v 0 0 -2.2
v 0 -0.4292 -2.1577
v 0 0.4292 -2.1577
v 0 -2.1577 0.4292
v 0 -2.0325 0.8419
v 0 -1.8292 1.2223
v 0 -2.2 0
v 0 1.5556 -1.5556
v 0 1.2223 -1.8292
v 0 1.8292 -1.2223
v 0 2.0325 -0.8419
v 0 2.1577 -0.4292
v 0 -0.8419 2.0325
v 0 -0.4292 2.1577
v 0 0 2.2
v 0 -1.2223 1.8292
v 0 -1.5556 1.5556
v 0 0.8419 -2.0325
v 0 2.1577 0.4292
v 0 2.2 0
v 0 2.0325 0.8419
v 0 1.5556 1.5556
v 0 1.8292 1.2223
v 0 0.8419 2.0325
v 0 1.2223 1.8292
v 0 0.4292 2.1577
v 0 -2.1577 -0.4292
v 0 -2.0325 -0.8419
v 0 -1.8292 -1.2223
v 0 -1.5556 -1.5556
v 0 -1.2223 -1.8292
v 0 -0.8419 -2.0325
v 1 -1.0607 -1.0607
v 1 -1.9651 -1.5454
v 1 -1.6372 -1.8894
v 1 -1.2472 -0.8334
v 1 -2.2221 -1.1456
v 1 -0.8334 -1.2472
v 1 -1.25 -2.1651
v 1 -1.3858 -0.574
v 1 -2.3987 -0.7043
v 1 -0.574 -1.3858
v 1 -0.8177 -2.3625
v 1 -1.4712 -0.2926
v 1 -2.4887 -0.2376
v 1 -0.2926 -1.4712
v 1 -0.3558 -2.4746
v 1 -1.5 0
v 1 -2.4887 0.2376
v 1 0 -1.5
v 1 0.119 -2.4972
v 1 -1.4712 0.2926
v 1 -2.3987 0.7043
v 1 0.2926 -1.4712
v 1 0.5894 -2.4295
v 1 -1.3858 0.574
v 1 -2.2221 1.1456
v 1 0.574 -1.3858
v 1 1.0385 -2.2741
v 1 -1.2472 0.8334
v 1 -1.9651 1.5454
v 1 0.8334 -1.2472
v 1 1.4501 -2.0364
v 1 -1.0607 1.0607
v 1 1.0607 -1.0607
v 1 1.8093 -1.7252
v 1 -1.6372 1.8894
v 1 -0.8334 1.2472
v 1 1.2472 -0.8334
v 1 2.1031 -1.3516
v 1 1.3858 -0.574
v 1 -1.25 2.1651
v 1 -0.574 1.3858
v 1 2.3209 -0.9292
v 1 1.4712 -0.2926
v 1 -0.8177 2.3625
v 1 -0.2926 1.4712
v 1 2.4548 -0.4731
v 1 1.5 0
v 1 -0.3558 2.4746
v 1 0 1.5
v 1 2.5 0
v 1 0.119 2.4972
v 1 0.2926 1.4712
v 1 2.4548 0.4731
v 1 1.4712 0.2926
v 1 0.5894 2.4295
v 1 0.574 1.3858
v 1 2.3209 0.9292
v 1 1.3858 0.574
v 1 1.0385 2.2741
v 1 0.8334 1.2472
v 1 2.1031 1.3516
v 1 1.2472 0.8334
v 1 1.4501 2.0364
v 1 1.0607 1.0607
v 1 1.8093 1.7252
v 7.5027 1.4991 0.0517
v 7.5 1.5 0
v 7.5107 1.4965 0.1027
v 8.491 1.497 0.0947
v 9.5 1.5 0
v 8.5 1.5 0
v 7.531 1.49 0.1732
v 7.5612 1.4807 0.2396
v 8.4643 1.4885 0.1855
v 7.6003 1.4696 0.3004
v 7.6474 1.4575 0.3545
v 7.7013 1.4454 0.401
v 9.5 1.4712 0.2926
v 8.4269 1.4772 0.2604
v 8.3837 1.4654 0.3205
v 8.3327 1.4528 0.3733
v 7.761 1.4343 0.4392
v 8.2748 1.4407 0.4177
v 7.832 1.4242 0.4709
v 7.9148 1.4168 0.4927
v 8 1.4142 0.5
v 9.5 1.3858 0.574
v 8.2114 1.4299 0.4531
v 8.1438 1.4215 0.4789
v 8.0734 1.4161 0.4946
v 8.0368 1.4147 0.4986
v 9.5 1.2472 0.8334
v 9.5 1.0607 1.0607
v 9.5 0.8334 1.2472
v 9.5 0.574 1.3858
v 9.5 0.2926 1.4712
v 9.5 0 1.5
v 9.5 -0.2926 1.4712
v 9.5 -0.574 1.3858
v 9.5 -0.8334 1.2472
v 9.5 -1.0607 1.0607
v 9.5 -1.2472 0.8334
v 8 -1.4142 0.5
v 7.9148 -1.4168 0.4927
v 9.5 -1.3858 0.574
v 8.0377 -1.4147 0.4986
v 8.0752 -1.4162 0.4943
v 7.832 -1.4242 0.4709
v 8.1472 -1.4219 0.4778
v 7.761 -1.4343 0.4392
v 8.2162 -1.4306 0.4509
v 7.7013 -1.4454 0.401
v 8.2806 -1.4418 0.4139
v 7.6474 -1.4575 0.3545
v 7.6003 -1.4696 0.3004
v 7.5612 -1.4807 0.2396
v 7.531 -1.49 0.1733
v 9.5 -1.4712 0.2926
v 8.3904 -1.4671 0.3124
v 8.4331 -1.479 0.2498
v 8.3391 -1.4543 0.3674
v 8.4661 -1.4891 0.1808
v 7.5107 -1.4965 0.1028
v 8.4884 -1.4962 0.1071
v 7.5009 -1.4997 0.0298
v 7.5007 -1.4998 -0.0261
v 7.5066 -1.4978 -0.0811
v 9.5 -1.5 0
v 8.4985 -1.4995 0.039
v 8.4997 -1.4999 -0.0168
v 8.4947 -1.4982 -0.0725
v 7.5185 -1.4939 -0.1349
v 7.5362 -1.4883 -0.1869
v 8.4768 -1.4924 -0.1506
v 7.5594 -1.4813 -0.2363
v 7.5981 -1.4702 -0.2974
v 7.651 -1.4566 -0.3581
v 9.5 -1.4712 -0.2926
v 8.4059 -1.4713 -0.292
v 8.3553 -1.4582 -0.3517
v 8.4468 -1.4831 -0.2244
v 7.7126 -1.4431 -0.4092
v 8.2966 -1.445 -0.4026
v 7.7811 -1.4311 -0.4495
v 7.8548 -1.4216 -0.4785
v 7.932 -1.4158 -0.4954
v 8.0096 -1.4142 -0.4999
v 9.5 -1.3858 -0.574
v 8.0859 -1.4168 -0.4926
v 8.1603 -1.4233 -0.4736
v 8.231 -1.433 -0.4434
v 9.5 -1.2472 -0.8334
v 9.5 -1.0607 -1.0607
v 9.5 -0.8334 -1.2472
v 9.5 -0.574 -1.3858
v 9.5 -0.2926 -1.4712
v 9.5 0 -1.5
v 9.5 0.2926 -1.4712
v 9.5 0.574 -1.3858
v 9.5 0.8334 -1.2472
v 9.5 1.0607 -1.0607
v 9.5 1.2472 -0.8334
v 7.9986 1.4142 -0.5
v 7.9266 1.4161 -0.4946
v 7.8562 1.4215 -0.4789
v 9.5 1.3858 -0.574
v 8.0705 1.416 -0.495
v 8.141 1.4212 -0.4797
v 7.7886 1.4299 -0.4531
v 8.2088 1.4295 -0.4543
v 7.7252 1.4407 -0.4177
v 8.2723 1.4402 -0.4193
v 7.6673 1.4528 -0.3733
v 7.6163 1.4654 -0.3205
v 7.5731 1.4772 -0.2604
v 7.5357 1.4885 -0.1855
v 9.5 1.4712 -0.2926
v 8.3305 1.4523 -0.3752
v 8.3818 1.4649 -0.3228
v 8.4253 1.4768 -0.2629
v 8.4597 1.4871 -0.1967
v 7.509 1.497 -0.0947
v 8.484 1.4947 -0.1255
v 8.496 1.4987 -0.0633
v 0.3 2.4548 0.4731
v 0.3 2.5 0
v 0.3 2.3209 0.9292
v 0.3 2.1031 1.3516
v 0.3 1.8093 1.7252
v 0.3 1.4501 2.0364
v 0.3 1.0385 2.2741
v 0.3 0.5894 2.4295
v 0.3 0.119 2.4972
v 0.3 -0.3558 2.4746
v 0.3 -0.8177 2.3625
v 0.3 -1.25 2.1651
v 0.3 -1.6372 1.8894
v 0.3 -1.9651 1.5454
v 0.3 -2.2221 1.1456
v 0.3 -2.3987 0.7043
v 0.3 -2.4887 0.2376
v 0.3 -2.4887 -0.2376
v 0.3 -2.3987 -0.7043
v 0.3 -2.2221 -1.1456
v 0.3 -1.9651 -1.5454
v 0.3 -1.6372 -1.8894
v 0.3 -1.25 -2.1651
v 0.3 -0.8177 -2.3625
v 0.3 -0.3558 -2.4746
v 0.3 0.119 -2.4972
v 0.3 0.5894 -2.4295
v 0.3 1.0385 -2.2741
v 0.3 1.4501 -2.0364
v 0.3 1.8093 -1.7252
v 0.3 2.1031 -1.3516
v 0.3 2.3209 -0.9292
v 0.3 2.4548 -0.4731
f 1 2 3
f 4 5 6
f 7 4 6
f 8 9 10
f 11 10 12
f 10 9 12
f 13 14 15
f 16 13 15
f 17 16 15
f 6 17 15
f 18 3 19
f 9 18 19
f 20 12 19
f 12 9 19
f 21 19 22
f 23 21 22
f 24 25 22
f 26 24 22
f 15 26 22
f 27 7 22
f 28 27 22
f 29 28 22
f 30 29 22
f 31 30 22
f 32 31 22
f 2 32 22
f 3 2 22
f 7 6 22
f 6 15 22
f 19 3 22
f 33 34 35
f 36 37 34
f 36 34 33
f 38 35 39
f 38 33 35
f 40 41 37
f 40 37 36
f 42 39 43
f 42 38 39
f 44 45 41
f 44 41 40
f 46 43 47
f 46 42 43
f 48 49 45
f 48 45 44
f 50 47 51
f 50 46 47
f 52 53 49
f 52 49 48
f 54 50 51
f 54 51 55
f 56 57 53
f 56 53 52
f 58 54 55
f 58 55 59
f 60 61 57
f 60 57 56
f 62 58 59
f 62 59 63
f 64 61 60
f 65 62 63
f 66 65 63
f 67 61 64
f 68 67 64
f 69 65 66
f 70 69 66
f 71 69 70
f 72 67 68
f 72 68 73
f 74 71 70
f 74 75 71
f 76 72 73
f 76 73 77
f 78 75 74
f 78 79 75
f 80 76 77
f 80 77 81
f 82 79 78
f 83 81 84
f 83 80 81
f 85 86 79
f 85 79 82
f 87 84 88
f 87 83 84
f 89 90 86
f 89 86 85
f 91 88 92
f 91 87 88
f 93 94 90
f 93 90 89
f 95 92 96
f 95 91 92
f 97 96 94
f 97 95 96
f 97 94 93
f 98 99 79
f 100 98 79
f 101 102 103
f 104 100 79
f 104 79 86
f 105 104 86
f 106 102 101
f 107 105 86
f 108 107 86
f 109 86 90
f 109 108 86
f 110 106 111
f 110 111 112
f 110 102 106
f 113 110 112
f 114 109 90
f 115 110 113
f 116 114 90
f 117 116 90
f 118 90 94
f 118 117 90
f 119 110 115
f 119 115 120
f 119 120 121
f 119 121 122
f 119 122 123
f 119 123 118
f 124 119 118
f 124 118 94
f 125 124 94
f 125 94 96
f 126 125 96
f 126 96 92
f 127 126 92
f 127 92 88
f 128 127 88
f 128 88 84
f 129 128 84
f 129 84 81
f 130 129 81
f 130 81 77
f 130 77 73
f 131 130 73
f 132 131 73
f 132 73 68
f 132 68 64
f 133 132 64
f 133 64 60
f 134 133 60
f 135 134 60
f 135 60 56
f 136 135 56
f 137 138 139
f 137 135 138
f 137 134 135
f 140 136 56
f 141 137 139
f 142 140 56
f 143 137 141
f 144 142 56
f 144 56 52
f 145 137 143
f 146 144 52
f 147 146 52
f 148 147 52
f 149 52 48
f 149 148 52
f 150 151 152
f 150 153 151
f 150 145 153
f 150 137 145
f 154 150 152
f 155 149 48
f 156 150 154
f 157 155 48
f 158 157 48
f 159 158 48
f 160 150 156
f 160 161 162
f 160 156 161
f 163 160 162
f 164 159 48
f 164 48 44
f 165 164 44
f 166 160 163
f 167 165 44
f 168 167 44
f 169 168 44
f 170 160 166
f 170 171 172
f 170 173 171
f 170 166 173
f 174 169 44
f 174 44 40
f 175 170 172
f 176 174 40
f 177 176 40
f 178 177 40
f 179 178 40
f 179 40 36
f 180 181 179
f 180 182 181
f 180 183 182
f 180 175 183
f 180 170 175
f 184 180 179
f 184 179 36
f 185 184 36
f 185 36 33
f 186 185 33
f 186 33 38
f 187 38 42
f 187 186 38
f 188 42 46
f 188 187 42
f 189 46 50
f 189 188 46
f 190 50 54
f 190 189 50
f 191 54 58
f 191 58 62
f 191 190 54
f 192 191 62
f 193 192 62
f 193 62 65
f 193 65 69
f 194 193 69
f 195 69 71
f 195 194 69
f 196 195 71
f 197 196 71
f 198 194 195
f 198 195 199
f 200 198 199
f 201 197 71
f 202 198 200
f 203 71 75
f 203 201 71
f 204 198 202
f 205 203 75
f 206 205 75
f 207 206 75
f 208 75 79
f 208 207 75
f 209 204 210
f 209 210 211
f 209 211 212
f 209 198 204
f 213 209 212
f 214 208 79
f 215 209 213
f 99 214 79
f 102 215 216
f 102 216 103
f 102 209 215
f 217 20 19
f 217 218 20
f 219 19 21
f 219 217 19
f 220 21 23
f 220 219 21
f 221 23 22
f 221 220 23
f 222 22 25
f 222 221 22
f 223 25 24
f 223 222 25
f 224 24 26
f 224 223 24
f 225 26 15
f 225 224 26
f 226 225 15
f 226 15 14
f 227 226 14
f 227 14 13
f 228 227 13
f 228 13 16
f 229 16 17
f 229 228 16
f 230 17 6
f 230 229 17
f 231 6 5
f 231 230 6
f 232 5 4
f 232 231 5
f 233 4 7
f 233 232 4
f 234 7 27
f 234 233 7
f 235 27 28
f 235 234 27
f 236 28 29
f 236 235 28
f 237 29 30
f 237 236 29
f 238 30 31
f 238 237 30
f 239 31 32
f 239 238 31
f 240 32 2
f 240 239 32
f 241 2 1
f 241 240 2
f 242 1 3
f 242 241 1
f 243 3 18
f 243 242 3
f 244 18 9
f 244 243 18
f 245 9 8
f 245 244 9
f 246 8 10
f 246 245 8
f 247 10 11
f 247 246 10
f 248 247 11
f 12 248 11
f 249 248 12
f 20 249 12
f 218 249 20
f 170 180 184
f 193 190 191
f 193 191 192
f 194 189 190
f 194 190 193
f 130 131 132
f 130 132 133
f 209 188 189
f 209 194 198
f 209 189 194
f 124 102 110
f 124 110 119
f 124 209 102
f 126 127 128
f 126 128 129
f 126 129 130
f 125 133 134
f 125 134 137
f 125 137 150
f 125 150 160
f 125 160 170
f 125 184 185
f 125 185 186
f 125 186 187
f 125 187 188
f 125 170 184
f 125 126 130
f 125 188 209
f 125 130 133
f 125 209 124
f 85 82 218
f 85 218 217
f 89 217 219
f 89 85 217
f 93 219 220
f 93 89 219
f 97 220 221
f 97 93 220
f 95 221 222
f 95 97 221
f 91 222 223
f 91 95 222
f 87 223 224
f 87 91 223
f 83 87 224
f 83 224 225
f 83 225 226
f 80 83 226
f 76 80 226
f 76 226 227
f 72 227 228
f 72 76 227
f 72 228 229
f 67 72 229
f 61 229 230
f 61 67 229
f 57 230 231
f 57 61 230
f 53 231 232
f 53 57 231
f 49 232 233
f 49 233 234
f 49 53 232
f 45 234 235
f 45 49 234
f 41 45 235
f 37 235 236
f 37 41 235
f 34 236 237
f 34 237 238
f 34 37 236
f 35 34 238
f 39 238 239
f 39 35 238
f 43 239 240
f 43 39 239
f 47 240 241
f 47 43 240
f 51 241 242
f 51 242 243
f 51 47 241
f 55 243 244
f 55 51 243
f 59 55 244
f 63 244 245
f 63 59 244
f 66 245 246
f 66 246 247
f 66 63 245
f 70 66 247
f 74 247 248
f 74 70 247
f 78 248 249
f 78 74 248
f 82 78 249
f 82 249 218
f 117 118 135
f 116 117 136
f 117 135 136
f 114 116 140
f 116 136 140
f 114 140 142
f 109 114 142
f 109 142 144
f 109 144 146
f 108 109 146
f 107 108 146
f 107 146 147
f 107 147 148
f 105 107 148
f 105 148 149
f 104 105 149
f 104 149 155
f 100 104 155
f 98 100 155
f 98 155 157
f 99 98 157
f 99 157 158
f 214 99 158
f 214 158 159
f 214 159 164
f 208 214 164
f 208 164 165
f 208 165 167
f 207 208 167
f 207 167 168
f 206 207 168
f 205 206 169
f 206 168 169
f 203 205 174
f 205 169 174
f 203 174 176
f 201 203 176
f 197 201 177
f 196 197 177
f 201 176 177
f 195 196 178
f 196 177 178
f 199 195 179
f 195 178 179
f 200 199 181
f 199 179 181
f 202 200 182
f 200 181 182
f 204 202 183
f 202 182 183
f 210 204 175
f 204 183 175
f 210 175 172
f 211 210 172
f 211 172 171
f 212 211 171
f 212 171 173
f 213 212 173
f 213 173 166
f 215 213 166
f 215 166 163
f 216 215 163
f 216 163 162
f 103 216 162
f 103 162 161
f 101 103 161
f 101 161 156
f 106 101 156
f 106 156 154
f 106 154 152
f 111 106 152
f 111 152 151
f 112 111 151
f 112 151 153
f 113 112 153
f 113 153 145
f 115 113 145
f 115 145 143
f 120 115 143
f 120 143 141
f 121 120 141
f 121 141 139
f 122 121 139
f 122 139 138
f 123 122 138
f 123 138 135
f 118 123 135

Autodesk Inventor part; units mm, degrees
ref_plane "YZ Plane" through (0, 0, 0) normal (1, 0, 0) x (0, 1, 0)
ref_plane "XY Plane" through (0, 0, 0) normal (0, 0, 1) x (1, 0, 0)
sketch "Skizze1" plane through (0, 0, 0) normal (0, 0, 1) x (1, 0, 0)
  line L0 (0, -0.5) -> (0, 3) projected
  line L1 (-1.9, 0) -> (11.4, 0) projected
  line L2 (0, 0) -> (0, 2.5)
  line L3 (1, 2.5) -> (1, 1.5)
  line L4 (1, 1.5) -> (9.5, 1.5)
  line L5 (9.5, 1.5) -> (9.5, 0)
  line L6 (0, 0) -> (9.5, 0)
  line L7 (0, 2.5) -> (1, 2.5)
  dimension "d0" = 5
  dimension "d1" = 3
  dimension "d2" = 9.5
  dimension "d3" = 8.5
revolve "Umdrehung1" add sketch "Skizze1" angle 360 about axis through (-10, 0, 0) along (1, 0, 0)
chamfer "Fase1" distance 0.3 angle 45 1 edges at (0, -2.5, 0)
ref_plane "Arbeitsebene1" through (5.25, 1.5, 0) normal (0, 1, 0) x (-1, 0, 0)
sketch "Skizze2" plane through (5.25, 1.5, 0) normal (0, 1, 0) x (-1, 0, 0)
  line L0 (4.25, 1.5) -> (4.25, -1.5) projected
  line L1 (-4.25, 1.5) -> (-4.25, -1.5) projected
  line L2 (4.25, 1.5) -> (4.25, -1.5) projected
  line L3 (-4.25, 1.5) -> (-4.25, -1.5) projected
  line L4 (4.25, 1.5) -> (-4.25, 1.5) projected
  line L5 (4.25, -1.5) -> (-4.25, -1.5) projected
  point P0 (5.25, 0)
  point P1 (-2.75, 0)
  dimension "d8" = 1.5
  dimension "d9" = 1.5
hole "Bohrung1" at (8, 1.5, 0) direction (0, -1, 0) diameter 1 end through all
properties part number "Bolzen"
